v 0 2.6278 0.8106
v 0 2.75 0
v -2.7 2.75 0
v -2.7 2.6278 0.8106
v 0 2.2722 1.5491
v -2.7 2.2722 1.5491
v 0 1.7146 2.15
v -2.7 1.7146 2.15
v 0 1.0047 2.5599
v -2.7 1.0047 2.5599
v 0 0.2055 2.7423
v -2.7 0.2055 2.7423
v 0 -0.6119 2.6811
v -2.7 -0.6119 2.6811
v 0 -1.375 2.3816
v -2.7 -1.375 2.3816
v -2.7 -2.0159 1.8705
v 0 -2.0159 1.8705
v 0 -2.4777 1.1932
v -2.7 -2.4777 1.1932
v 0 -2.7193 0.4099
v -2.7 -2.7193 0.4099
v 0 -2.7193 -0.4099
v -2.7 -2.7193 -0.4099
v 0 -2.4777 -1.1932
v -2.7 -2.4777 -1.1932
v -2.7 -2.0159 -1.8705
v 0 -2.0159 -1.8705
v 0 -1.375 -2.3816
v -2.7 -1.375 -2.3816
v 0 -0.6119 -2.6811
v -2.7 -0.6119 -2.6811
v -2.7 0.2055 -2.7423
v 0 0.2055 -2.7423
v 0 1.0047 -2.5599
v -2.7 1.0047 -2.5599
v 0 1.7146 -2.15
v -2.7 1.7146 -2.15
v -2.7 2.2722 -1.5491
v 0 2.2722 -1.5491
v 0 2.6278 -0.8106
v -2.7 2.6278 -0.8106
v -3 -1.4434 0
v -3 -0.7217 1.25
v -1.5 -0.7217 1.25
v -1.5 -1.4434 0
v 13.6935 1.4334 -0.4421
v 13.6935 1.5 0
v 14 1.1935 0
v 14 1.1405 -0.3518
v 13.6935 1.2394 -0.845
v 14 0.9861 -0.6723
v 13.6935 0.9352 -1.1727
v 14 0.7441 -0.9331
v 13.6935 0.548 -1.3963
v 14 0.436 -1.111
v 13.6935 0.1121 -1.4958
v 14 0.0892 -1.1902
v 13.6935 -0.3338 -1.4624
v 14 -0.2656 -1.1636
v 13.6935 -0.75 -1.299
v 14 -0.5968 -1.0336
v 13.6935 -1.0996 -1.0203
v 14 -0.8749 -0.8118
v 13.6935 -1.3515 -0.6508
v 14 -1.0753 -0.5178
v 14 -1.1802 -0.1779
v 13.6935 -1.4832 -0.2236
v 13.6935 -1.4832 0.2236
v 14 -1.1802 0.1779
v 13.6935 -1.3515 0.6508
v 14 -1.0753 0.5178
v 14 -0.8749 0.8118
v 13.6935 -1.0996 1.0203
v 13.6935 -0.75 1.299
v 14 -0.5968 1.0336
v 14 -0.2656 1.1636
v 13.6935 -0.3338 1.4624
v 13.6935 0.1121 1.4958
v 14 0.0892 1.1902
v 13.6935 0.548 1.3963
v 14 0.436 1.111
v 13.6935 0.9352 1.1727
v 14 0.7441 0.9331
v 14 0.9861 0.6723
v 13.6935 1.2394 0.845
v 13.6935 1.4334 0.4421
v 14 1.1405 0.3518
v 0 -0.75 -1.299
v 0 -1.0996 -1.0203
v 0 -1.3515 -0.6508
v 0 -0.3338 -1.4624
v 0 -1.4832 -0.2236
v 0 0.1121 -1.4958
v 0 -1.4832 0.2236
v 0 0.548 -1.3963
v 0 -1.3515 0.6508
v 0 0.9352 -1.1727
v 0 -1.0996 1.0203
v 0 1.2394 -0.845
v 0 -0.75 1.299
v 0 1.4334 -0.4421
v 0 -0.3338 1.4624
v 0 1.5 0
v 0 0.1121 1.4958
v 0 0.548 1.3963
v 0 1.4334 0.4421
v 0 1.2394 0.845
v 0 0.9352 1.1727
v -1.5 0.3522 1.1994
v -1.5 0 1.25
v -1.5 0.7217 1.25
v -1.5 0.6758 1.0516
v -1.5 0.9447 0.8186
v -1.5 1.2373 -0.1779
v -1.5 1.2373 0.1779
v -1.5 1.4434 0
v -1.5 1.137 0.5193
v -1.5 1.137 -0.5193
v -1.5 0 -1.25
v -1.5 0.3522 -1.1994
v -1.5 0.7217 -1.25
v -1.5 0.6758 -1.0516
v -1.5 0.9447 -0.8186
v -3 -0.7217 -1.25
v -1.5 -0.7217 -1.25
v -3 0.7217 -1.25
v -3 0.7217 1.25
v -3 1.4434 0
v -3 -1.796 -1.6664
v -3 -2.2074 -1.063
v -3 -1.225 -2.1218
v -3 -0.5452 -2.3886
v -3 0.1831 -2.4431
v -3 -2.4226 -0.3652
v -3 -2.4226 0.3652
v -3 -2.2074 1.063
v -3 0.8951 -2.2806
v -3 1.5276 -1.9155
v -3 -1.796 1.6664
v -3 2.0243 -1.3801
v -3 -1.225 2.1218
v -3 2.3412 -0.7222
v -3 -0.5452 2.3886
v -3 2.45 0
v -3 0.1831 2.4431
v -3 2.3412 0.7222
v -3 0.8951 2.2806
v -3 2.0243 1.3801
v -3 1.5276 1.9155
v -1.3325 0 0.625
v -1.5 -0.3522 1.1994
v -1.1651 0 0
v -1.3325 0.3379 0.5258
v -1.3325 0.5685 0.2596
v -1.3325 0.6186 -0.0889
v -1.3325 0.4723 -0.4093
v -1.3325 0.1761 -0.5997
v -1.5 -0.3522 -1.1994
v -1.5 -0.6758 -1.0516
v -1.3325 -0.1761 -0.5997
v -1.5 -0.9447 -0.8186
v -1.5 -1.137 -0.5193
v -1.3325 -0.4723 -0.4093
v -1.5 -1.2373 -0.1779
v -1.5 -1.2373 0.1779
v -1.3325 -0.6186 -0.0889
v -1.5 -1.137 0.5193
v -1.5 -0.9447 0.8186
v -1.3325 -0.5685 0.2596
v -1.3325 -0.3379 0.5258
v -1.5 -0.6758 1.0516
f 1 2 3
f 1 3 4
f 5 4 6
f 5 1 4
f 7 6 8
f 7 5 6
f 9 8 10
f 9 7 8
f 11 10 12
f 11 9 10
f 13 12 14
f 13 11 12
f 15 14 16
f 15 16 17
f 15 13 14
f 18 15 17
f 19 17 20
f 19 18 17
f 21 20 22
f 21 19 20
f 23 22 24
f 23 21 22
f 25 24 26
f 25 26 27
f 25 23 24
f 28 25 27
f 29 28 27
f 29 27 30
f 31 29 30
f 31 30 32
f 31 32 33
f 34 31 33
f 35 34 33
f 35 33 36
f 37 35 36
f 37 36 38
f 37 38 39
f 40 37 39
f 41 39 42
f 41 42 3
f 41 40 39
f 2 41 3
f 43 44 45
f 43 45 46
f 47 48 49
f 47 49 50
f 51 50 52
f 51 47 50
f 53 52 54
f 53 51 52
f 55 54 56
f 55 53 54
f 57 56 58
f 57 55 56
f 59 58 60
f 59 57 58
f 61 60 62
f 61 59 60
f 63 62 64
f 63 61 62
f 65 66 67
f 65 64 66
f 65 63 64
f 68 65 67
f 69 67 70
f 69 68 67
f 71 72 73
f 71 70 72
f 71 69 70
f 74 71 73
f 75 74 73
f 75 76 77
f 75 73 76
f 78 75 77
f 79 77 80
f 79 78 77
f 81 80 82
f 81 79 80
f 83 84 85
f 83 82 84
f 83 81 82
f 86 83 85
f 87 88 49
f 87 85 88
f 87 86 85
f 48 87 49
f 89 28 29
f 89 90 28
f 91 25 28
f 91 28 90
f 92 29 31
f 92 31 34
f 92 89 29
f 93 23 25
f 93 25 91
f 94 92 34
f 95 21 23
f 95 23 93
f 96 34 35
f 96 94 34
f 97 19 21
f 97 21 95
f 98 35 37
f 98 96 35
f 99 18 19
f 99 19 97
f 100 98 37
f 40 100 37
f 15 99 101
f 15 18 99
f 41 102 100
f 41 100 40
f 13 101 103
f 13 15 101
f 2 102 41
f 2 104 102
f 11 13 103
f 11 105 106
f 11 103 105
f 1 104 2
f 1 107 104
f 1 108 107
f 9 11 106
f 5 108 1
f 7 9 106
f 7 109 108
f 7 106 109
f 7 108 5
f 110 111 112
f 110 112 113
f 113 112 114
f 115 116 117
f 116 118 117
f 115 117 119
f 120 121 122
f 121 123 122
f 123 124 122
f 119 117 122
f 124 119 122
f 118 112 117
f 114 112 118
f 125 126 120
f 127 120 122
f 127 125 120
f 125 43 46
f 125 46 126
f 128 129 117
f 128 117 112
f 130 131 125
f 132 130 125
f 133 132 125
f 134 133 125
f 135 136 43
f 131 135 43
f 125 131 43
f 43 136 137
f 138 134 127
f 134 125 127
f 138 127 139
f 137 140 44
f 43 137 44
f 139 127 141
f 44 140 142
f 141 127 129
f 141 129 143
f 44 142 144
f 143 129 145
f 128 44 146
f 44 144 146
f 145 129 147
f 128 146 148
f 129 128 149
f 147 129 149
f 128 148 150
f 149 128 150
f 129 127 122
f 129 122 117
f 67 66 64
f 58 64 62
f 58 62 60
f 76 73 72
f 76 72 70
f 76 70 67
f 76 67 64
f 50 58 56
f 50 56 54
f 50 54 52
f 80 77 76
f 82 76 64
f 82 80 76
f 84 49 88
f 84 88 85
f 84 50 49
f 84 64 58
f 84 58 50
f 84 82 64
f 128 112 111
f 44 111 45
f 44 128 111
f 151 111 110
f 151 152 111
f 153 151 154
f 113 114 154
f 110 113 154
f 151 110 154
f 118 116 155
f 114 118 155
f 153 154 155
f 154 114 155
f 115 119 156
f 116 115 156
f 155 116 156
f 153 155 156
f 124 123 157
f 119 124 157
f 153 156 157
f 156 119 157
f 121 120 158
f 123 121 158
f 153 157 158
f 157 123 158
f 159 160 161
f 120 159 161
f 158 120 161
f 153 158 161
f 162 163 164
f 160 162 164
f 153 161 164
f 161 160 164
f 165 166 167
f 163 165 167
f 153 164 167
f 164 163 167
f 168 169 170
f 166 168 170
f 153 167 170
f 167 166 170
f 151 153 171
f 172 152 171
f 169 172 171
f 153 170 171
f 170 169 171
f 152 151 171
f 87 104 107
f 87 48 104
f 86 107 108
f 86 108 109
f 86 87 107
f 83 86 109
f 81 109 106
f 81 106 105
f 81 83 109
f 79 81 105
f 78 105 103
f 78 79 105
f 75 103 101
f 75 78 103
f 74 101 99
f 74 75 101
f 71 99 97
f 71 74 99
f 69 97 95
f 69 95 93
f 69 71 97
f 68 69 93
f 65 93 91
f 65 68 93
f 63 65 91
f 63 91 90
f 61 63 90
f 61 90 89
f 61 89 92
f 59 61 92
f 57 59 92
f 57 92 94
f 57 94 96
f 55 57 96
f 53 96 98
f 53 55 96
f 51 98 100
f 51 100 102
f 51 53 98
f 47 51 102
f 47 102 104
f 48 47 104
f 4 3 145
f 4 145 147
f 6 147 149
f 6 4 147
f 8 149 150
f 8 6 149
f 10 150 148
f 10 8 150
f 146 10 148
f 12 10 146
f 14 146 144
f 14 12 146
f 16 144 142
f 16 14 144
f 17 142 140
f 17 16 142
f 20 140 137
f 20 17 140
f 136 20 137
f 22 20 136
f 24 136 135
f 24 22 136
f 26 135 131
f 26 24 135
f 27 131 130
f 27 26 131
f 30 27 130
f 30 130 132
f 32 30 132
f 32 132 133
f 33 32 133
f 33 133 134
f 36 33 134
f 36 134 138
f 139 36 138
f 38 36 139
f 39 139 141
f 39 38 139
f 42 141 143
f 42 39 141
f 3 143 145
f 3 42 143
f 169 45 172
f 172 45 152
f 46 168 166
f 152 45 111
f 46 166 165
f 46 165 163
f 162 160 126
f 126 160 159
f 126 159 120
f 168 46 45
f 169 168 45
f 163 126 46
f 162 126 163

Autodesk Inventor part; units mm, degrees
sketch "Sketch_1" plane through (0, 0, 0) normal (0, 0, 1) x (1, 0, 0)
  line L0 (14, 0) -> (-3, 0)
  line L1 (-3, 0) -> (-3, 2.45)
  line L2 (-3, 2.45) -> (-2.7, 2.75)
  line L3 (-2.7, 2.75) -> (0, 2.75)
  line L4 (0, 2.75) -> (0, 1.5)
  line L5 (0, 1.5) -> (13.6935, 1.5)
  line L6 (13.6935, 1.5) -> (14, 1.1935)
  line L7 (14, 1.1935) -> (14, 0)
  line L8 (14, 0) -> (-3, 0)
revolve "Revolution1" add sketch "Sketch_1" angle 360 about axis through (14, 0, 0) along (1, 0, 0)
thread "Thread1" size "M3x0.5" class "6g" standard "ISO Metric profile" length 13.5 offset 0.5
sketch "Sketch2" plane through (-3, 0, 0) normal (-1, 0, 0) x (0, 0, 1)
  point P0 (0, 0)
hole "Hole1" at (-3, 0, 0) direction (1, 0, 0) diameter 2.5 depth 1.5 tip angle 150
sketch "Sketch_3" plane through (-3, 0, 0) normal (1, 0, 0) x (0, 0, -1)
  line L0 (-1.25, -0.7217) -> (0, -1.4434)
  line L1 (0, -1.4434) -> (1.25, -0.7217)
  line L2 (1.25, -0.7217) -> (1.25, 0.7217)
  line L3 (1.25, 0.7217) -> (0, 1.4434)
  line L4 (0, 1.4434) -> (-1.25, 0.7217)
  line L5 (-1.25, 0.7217) -> (-1.25, -0.7217)
extrude "Extrusion1" cut sketch "Sketch_3" along normal blind 1.5
ref_plane "to_cp_XY" through (0, 0, 0) normal (1, 0, 0) x (0, 0, -1)
ref_plane "to_cp_YZ" through (0, 0, 0) normal (0, 0, -1) x (0, 1, 0)
ref_plane "to_cp_ZX" through (0, 0, 0) normal (0, 1, 0) x (1, 0, 0)
properties part number "BOLT3-14"
